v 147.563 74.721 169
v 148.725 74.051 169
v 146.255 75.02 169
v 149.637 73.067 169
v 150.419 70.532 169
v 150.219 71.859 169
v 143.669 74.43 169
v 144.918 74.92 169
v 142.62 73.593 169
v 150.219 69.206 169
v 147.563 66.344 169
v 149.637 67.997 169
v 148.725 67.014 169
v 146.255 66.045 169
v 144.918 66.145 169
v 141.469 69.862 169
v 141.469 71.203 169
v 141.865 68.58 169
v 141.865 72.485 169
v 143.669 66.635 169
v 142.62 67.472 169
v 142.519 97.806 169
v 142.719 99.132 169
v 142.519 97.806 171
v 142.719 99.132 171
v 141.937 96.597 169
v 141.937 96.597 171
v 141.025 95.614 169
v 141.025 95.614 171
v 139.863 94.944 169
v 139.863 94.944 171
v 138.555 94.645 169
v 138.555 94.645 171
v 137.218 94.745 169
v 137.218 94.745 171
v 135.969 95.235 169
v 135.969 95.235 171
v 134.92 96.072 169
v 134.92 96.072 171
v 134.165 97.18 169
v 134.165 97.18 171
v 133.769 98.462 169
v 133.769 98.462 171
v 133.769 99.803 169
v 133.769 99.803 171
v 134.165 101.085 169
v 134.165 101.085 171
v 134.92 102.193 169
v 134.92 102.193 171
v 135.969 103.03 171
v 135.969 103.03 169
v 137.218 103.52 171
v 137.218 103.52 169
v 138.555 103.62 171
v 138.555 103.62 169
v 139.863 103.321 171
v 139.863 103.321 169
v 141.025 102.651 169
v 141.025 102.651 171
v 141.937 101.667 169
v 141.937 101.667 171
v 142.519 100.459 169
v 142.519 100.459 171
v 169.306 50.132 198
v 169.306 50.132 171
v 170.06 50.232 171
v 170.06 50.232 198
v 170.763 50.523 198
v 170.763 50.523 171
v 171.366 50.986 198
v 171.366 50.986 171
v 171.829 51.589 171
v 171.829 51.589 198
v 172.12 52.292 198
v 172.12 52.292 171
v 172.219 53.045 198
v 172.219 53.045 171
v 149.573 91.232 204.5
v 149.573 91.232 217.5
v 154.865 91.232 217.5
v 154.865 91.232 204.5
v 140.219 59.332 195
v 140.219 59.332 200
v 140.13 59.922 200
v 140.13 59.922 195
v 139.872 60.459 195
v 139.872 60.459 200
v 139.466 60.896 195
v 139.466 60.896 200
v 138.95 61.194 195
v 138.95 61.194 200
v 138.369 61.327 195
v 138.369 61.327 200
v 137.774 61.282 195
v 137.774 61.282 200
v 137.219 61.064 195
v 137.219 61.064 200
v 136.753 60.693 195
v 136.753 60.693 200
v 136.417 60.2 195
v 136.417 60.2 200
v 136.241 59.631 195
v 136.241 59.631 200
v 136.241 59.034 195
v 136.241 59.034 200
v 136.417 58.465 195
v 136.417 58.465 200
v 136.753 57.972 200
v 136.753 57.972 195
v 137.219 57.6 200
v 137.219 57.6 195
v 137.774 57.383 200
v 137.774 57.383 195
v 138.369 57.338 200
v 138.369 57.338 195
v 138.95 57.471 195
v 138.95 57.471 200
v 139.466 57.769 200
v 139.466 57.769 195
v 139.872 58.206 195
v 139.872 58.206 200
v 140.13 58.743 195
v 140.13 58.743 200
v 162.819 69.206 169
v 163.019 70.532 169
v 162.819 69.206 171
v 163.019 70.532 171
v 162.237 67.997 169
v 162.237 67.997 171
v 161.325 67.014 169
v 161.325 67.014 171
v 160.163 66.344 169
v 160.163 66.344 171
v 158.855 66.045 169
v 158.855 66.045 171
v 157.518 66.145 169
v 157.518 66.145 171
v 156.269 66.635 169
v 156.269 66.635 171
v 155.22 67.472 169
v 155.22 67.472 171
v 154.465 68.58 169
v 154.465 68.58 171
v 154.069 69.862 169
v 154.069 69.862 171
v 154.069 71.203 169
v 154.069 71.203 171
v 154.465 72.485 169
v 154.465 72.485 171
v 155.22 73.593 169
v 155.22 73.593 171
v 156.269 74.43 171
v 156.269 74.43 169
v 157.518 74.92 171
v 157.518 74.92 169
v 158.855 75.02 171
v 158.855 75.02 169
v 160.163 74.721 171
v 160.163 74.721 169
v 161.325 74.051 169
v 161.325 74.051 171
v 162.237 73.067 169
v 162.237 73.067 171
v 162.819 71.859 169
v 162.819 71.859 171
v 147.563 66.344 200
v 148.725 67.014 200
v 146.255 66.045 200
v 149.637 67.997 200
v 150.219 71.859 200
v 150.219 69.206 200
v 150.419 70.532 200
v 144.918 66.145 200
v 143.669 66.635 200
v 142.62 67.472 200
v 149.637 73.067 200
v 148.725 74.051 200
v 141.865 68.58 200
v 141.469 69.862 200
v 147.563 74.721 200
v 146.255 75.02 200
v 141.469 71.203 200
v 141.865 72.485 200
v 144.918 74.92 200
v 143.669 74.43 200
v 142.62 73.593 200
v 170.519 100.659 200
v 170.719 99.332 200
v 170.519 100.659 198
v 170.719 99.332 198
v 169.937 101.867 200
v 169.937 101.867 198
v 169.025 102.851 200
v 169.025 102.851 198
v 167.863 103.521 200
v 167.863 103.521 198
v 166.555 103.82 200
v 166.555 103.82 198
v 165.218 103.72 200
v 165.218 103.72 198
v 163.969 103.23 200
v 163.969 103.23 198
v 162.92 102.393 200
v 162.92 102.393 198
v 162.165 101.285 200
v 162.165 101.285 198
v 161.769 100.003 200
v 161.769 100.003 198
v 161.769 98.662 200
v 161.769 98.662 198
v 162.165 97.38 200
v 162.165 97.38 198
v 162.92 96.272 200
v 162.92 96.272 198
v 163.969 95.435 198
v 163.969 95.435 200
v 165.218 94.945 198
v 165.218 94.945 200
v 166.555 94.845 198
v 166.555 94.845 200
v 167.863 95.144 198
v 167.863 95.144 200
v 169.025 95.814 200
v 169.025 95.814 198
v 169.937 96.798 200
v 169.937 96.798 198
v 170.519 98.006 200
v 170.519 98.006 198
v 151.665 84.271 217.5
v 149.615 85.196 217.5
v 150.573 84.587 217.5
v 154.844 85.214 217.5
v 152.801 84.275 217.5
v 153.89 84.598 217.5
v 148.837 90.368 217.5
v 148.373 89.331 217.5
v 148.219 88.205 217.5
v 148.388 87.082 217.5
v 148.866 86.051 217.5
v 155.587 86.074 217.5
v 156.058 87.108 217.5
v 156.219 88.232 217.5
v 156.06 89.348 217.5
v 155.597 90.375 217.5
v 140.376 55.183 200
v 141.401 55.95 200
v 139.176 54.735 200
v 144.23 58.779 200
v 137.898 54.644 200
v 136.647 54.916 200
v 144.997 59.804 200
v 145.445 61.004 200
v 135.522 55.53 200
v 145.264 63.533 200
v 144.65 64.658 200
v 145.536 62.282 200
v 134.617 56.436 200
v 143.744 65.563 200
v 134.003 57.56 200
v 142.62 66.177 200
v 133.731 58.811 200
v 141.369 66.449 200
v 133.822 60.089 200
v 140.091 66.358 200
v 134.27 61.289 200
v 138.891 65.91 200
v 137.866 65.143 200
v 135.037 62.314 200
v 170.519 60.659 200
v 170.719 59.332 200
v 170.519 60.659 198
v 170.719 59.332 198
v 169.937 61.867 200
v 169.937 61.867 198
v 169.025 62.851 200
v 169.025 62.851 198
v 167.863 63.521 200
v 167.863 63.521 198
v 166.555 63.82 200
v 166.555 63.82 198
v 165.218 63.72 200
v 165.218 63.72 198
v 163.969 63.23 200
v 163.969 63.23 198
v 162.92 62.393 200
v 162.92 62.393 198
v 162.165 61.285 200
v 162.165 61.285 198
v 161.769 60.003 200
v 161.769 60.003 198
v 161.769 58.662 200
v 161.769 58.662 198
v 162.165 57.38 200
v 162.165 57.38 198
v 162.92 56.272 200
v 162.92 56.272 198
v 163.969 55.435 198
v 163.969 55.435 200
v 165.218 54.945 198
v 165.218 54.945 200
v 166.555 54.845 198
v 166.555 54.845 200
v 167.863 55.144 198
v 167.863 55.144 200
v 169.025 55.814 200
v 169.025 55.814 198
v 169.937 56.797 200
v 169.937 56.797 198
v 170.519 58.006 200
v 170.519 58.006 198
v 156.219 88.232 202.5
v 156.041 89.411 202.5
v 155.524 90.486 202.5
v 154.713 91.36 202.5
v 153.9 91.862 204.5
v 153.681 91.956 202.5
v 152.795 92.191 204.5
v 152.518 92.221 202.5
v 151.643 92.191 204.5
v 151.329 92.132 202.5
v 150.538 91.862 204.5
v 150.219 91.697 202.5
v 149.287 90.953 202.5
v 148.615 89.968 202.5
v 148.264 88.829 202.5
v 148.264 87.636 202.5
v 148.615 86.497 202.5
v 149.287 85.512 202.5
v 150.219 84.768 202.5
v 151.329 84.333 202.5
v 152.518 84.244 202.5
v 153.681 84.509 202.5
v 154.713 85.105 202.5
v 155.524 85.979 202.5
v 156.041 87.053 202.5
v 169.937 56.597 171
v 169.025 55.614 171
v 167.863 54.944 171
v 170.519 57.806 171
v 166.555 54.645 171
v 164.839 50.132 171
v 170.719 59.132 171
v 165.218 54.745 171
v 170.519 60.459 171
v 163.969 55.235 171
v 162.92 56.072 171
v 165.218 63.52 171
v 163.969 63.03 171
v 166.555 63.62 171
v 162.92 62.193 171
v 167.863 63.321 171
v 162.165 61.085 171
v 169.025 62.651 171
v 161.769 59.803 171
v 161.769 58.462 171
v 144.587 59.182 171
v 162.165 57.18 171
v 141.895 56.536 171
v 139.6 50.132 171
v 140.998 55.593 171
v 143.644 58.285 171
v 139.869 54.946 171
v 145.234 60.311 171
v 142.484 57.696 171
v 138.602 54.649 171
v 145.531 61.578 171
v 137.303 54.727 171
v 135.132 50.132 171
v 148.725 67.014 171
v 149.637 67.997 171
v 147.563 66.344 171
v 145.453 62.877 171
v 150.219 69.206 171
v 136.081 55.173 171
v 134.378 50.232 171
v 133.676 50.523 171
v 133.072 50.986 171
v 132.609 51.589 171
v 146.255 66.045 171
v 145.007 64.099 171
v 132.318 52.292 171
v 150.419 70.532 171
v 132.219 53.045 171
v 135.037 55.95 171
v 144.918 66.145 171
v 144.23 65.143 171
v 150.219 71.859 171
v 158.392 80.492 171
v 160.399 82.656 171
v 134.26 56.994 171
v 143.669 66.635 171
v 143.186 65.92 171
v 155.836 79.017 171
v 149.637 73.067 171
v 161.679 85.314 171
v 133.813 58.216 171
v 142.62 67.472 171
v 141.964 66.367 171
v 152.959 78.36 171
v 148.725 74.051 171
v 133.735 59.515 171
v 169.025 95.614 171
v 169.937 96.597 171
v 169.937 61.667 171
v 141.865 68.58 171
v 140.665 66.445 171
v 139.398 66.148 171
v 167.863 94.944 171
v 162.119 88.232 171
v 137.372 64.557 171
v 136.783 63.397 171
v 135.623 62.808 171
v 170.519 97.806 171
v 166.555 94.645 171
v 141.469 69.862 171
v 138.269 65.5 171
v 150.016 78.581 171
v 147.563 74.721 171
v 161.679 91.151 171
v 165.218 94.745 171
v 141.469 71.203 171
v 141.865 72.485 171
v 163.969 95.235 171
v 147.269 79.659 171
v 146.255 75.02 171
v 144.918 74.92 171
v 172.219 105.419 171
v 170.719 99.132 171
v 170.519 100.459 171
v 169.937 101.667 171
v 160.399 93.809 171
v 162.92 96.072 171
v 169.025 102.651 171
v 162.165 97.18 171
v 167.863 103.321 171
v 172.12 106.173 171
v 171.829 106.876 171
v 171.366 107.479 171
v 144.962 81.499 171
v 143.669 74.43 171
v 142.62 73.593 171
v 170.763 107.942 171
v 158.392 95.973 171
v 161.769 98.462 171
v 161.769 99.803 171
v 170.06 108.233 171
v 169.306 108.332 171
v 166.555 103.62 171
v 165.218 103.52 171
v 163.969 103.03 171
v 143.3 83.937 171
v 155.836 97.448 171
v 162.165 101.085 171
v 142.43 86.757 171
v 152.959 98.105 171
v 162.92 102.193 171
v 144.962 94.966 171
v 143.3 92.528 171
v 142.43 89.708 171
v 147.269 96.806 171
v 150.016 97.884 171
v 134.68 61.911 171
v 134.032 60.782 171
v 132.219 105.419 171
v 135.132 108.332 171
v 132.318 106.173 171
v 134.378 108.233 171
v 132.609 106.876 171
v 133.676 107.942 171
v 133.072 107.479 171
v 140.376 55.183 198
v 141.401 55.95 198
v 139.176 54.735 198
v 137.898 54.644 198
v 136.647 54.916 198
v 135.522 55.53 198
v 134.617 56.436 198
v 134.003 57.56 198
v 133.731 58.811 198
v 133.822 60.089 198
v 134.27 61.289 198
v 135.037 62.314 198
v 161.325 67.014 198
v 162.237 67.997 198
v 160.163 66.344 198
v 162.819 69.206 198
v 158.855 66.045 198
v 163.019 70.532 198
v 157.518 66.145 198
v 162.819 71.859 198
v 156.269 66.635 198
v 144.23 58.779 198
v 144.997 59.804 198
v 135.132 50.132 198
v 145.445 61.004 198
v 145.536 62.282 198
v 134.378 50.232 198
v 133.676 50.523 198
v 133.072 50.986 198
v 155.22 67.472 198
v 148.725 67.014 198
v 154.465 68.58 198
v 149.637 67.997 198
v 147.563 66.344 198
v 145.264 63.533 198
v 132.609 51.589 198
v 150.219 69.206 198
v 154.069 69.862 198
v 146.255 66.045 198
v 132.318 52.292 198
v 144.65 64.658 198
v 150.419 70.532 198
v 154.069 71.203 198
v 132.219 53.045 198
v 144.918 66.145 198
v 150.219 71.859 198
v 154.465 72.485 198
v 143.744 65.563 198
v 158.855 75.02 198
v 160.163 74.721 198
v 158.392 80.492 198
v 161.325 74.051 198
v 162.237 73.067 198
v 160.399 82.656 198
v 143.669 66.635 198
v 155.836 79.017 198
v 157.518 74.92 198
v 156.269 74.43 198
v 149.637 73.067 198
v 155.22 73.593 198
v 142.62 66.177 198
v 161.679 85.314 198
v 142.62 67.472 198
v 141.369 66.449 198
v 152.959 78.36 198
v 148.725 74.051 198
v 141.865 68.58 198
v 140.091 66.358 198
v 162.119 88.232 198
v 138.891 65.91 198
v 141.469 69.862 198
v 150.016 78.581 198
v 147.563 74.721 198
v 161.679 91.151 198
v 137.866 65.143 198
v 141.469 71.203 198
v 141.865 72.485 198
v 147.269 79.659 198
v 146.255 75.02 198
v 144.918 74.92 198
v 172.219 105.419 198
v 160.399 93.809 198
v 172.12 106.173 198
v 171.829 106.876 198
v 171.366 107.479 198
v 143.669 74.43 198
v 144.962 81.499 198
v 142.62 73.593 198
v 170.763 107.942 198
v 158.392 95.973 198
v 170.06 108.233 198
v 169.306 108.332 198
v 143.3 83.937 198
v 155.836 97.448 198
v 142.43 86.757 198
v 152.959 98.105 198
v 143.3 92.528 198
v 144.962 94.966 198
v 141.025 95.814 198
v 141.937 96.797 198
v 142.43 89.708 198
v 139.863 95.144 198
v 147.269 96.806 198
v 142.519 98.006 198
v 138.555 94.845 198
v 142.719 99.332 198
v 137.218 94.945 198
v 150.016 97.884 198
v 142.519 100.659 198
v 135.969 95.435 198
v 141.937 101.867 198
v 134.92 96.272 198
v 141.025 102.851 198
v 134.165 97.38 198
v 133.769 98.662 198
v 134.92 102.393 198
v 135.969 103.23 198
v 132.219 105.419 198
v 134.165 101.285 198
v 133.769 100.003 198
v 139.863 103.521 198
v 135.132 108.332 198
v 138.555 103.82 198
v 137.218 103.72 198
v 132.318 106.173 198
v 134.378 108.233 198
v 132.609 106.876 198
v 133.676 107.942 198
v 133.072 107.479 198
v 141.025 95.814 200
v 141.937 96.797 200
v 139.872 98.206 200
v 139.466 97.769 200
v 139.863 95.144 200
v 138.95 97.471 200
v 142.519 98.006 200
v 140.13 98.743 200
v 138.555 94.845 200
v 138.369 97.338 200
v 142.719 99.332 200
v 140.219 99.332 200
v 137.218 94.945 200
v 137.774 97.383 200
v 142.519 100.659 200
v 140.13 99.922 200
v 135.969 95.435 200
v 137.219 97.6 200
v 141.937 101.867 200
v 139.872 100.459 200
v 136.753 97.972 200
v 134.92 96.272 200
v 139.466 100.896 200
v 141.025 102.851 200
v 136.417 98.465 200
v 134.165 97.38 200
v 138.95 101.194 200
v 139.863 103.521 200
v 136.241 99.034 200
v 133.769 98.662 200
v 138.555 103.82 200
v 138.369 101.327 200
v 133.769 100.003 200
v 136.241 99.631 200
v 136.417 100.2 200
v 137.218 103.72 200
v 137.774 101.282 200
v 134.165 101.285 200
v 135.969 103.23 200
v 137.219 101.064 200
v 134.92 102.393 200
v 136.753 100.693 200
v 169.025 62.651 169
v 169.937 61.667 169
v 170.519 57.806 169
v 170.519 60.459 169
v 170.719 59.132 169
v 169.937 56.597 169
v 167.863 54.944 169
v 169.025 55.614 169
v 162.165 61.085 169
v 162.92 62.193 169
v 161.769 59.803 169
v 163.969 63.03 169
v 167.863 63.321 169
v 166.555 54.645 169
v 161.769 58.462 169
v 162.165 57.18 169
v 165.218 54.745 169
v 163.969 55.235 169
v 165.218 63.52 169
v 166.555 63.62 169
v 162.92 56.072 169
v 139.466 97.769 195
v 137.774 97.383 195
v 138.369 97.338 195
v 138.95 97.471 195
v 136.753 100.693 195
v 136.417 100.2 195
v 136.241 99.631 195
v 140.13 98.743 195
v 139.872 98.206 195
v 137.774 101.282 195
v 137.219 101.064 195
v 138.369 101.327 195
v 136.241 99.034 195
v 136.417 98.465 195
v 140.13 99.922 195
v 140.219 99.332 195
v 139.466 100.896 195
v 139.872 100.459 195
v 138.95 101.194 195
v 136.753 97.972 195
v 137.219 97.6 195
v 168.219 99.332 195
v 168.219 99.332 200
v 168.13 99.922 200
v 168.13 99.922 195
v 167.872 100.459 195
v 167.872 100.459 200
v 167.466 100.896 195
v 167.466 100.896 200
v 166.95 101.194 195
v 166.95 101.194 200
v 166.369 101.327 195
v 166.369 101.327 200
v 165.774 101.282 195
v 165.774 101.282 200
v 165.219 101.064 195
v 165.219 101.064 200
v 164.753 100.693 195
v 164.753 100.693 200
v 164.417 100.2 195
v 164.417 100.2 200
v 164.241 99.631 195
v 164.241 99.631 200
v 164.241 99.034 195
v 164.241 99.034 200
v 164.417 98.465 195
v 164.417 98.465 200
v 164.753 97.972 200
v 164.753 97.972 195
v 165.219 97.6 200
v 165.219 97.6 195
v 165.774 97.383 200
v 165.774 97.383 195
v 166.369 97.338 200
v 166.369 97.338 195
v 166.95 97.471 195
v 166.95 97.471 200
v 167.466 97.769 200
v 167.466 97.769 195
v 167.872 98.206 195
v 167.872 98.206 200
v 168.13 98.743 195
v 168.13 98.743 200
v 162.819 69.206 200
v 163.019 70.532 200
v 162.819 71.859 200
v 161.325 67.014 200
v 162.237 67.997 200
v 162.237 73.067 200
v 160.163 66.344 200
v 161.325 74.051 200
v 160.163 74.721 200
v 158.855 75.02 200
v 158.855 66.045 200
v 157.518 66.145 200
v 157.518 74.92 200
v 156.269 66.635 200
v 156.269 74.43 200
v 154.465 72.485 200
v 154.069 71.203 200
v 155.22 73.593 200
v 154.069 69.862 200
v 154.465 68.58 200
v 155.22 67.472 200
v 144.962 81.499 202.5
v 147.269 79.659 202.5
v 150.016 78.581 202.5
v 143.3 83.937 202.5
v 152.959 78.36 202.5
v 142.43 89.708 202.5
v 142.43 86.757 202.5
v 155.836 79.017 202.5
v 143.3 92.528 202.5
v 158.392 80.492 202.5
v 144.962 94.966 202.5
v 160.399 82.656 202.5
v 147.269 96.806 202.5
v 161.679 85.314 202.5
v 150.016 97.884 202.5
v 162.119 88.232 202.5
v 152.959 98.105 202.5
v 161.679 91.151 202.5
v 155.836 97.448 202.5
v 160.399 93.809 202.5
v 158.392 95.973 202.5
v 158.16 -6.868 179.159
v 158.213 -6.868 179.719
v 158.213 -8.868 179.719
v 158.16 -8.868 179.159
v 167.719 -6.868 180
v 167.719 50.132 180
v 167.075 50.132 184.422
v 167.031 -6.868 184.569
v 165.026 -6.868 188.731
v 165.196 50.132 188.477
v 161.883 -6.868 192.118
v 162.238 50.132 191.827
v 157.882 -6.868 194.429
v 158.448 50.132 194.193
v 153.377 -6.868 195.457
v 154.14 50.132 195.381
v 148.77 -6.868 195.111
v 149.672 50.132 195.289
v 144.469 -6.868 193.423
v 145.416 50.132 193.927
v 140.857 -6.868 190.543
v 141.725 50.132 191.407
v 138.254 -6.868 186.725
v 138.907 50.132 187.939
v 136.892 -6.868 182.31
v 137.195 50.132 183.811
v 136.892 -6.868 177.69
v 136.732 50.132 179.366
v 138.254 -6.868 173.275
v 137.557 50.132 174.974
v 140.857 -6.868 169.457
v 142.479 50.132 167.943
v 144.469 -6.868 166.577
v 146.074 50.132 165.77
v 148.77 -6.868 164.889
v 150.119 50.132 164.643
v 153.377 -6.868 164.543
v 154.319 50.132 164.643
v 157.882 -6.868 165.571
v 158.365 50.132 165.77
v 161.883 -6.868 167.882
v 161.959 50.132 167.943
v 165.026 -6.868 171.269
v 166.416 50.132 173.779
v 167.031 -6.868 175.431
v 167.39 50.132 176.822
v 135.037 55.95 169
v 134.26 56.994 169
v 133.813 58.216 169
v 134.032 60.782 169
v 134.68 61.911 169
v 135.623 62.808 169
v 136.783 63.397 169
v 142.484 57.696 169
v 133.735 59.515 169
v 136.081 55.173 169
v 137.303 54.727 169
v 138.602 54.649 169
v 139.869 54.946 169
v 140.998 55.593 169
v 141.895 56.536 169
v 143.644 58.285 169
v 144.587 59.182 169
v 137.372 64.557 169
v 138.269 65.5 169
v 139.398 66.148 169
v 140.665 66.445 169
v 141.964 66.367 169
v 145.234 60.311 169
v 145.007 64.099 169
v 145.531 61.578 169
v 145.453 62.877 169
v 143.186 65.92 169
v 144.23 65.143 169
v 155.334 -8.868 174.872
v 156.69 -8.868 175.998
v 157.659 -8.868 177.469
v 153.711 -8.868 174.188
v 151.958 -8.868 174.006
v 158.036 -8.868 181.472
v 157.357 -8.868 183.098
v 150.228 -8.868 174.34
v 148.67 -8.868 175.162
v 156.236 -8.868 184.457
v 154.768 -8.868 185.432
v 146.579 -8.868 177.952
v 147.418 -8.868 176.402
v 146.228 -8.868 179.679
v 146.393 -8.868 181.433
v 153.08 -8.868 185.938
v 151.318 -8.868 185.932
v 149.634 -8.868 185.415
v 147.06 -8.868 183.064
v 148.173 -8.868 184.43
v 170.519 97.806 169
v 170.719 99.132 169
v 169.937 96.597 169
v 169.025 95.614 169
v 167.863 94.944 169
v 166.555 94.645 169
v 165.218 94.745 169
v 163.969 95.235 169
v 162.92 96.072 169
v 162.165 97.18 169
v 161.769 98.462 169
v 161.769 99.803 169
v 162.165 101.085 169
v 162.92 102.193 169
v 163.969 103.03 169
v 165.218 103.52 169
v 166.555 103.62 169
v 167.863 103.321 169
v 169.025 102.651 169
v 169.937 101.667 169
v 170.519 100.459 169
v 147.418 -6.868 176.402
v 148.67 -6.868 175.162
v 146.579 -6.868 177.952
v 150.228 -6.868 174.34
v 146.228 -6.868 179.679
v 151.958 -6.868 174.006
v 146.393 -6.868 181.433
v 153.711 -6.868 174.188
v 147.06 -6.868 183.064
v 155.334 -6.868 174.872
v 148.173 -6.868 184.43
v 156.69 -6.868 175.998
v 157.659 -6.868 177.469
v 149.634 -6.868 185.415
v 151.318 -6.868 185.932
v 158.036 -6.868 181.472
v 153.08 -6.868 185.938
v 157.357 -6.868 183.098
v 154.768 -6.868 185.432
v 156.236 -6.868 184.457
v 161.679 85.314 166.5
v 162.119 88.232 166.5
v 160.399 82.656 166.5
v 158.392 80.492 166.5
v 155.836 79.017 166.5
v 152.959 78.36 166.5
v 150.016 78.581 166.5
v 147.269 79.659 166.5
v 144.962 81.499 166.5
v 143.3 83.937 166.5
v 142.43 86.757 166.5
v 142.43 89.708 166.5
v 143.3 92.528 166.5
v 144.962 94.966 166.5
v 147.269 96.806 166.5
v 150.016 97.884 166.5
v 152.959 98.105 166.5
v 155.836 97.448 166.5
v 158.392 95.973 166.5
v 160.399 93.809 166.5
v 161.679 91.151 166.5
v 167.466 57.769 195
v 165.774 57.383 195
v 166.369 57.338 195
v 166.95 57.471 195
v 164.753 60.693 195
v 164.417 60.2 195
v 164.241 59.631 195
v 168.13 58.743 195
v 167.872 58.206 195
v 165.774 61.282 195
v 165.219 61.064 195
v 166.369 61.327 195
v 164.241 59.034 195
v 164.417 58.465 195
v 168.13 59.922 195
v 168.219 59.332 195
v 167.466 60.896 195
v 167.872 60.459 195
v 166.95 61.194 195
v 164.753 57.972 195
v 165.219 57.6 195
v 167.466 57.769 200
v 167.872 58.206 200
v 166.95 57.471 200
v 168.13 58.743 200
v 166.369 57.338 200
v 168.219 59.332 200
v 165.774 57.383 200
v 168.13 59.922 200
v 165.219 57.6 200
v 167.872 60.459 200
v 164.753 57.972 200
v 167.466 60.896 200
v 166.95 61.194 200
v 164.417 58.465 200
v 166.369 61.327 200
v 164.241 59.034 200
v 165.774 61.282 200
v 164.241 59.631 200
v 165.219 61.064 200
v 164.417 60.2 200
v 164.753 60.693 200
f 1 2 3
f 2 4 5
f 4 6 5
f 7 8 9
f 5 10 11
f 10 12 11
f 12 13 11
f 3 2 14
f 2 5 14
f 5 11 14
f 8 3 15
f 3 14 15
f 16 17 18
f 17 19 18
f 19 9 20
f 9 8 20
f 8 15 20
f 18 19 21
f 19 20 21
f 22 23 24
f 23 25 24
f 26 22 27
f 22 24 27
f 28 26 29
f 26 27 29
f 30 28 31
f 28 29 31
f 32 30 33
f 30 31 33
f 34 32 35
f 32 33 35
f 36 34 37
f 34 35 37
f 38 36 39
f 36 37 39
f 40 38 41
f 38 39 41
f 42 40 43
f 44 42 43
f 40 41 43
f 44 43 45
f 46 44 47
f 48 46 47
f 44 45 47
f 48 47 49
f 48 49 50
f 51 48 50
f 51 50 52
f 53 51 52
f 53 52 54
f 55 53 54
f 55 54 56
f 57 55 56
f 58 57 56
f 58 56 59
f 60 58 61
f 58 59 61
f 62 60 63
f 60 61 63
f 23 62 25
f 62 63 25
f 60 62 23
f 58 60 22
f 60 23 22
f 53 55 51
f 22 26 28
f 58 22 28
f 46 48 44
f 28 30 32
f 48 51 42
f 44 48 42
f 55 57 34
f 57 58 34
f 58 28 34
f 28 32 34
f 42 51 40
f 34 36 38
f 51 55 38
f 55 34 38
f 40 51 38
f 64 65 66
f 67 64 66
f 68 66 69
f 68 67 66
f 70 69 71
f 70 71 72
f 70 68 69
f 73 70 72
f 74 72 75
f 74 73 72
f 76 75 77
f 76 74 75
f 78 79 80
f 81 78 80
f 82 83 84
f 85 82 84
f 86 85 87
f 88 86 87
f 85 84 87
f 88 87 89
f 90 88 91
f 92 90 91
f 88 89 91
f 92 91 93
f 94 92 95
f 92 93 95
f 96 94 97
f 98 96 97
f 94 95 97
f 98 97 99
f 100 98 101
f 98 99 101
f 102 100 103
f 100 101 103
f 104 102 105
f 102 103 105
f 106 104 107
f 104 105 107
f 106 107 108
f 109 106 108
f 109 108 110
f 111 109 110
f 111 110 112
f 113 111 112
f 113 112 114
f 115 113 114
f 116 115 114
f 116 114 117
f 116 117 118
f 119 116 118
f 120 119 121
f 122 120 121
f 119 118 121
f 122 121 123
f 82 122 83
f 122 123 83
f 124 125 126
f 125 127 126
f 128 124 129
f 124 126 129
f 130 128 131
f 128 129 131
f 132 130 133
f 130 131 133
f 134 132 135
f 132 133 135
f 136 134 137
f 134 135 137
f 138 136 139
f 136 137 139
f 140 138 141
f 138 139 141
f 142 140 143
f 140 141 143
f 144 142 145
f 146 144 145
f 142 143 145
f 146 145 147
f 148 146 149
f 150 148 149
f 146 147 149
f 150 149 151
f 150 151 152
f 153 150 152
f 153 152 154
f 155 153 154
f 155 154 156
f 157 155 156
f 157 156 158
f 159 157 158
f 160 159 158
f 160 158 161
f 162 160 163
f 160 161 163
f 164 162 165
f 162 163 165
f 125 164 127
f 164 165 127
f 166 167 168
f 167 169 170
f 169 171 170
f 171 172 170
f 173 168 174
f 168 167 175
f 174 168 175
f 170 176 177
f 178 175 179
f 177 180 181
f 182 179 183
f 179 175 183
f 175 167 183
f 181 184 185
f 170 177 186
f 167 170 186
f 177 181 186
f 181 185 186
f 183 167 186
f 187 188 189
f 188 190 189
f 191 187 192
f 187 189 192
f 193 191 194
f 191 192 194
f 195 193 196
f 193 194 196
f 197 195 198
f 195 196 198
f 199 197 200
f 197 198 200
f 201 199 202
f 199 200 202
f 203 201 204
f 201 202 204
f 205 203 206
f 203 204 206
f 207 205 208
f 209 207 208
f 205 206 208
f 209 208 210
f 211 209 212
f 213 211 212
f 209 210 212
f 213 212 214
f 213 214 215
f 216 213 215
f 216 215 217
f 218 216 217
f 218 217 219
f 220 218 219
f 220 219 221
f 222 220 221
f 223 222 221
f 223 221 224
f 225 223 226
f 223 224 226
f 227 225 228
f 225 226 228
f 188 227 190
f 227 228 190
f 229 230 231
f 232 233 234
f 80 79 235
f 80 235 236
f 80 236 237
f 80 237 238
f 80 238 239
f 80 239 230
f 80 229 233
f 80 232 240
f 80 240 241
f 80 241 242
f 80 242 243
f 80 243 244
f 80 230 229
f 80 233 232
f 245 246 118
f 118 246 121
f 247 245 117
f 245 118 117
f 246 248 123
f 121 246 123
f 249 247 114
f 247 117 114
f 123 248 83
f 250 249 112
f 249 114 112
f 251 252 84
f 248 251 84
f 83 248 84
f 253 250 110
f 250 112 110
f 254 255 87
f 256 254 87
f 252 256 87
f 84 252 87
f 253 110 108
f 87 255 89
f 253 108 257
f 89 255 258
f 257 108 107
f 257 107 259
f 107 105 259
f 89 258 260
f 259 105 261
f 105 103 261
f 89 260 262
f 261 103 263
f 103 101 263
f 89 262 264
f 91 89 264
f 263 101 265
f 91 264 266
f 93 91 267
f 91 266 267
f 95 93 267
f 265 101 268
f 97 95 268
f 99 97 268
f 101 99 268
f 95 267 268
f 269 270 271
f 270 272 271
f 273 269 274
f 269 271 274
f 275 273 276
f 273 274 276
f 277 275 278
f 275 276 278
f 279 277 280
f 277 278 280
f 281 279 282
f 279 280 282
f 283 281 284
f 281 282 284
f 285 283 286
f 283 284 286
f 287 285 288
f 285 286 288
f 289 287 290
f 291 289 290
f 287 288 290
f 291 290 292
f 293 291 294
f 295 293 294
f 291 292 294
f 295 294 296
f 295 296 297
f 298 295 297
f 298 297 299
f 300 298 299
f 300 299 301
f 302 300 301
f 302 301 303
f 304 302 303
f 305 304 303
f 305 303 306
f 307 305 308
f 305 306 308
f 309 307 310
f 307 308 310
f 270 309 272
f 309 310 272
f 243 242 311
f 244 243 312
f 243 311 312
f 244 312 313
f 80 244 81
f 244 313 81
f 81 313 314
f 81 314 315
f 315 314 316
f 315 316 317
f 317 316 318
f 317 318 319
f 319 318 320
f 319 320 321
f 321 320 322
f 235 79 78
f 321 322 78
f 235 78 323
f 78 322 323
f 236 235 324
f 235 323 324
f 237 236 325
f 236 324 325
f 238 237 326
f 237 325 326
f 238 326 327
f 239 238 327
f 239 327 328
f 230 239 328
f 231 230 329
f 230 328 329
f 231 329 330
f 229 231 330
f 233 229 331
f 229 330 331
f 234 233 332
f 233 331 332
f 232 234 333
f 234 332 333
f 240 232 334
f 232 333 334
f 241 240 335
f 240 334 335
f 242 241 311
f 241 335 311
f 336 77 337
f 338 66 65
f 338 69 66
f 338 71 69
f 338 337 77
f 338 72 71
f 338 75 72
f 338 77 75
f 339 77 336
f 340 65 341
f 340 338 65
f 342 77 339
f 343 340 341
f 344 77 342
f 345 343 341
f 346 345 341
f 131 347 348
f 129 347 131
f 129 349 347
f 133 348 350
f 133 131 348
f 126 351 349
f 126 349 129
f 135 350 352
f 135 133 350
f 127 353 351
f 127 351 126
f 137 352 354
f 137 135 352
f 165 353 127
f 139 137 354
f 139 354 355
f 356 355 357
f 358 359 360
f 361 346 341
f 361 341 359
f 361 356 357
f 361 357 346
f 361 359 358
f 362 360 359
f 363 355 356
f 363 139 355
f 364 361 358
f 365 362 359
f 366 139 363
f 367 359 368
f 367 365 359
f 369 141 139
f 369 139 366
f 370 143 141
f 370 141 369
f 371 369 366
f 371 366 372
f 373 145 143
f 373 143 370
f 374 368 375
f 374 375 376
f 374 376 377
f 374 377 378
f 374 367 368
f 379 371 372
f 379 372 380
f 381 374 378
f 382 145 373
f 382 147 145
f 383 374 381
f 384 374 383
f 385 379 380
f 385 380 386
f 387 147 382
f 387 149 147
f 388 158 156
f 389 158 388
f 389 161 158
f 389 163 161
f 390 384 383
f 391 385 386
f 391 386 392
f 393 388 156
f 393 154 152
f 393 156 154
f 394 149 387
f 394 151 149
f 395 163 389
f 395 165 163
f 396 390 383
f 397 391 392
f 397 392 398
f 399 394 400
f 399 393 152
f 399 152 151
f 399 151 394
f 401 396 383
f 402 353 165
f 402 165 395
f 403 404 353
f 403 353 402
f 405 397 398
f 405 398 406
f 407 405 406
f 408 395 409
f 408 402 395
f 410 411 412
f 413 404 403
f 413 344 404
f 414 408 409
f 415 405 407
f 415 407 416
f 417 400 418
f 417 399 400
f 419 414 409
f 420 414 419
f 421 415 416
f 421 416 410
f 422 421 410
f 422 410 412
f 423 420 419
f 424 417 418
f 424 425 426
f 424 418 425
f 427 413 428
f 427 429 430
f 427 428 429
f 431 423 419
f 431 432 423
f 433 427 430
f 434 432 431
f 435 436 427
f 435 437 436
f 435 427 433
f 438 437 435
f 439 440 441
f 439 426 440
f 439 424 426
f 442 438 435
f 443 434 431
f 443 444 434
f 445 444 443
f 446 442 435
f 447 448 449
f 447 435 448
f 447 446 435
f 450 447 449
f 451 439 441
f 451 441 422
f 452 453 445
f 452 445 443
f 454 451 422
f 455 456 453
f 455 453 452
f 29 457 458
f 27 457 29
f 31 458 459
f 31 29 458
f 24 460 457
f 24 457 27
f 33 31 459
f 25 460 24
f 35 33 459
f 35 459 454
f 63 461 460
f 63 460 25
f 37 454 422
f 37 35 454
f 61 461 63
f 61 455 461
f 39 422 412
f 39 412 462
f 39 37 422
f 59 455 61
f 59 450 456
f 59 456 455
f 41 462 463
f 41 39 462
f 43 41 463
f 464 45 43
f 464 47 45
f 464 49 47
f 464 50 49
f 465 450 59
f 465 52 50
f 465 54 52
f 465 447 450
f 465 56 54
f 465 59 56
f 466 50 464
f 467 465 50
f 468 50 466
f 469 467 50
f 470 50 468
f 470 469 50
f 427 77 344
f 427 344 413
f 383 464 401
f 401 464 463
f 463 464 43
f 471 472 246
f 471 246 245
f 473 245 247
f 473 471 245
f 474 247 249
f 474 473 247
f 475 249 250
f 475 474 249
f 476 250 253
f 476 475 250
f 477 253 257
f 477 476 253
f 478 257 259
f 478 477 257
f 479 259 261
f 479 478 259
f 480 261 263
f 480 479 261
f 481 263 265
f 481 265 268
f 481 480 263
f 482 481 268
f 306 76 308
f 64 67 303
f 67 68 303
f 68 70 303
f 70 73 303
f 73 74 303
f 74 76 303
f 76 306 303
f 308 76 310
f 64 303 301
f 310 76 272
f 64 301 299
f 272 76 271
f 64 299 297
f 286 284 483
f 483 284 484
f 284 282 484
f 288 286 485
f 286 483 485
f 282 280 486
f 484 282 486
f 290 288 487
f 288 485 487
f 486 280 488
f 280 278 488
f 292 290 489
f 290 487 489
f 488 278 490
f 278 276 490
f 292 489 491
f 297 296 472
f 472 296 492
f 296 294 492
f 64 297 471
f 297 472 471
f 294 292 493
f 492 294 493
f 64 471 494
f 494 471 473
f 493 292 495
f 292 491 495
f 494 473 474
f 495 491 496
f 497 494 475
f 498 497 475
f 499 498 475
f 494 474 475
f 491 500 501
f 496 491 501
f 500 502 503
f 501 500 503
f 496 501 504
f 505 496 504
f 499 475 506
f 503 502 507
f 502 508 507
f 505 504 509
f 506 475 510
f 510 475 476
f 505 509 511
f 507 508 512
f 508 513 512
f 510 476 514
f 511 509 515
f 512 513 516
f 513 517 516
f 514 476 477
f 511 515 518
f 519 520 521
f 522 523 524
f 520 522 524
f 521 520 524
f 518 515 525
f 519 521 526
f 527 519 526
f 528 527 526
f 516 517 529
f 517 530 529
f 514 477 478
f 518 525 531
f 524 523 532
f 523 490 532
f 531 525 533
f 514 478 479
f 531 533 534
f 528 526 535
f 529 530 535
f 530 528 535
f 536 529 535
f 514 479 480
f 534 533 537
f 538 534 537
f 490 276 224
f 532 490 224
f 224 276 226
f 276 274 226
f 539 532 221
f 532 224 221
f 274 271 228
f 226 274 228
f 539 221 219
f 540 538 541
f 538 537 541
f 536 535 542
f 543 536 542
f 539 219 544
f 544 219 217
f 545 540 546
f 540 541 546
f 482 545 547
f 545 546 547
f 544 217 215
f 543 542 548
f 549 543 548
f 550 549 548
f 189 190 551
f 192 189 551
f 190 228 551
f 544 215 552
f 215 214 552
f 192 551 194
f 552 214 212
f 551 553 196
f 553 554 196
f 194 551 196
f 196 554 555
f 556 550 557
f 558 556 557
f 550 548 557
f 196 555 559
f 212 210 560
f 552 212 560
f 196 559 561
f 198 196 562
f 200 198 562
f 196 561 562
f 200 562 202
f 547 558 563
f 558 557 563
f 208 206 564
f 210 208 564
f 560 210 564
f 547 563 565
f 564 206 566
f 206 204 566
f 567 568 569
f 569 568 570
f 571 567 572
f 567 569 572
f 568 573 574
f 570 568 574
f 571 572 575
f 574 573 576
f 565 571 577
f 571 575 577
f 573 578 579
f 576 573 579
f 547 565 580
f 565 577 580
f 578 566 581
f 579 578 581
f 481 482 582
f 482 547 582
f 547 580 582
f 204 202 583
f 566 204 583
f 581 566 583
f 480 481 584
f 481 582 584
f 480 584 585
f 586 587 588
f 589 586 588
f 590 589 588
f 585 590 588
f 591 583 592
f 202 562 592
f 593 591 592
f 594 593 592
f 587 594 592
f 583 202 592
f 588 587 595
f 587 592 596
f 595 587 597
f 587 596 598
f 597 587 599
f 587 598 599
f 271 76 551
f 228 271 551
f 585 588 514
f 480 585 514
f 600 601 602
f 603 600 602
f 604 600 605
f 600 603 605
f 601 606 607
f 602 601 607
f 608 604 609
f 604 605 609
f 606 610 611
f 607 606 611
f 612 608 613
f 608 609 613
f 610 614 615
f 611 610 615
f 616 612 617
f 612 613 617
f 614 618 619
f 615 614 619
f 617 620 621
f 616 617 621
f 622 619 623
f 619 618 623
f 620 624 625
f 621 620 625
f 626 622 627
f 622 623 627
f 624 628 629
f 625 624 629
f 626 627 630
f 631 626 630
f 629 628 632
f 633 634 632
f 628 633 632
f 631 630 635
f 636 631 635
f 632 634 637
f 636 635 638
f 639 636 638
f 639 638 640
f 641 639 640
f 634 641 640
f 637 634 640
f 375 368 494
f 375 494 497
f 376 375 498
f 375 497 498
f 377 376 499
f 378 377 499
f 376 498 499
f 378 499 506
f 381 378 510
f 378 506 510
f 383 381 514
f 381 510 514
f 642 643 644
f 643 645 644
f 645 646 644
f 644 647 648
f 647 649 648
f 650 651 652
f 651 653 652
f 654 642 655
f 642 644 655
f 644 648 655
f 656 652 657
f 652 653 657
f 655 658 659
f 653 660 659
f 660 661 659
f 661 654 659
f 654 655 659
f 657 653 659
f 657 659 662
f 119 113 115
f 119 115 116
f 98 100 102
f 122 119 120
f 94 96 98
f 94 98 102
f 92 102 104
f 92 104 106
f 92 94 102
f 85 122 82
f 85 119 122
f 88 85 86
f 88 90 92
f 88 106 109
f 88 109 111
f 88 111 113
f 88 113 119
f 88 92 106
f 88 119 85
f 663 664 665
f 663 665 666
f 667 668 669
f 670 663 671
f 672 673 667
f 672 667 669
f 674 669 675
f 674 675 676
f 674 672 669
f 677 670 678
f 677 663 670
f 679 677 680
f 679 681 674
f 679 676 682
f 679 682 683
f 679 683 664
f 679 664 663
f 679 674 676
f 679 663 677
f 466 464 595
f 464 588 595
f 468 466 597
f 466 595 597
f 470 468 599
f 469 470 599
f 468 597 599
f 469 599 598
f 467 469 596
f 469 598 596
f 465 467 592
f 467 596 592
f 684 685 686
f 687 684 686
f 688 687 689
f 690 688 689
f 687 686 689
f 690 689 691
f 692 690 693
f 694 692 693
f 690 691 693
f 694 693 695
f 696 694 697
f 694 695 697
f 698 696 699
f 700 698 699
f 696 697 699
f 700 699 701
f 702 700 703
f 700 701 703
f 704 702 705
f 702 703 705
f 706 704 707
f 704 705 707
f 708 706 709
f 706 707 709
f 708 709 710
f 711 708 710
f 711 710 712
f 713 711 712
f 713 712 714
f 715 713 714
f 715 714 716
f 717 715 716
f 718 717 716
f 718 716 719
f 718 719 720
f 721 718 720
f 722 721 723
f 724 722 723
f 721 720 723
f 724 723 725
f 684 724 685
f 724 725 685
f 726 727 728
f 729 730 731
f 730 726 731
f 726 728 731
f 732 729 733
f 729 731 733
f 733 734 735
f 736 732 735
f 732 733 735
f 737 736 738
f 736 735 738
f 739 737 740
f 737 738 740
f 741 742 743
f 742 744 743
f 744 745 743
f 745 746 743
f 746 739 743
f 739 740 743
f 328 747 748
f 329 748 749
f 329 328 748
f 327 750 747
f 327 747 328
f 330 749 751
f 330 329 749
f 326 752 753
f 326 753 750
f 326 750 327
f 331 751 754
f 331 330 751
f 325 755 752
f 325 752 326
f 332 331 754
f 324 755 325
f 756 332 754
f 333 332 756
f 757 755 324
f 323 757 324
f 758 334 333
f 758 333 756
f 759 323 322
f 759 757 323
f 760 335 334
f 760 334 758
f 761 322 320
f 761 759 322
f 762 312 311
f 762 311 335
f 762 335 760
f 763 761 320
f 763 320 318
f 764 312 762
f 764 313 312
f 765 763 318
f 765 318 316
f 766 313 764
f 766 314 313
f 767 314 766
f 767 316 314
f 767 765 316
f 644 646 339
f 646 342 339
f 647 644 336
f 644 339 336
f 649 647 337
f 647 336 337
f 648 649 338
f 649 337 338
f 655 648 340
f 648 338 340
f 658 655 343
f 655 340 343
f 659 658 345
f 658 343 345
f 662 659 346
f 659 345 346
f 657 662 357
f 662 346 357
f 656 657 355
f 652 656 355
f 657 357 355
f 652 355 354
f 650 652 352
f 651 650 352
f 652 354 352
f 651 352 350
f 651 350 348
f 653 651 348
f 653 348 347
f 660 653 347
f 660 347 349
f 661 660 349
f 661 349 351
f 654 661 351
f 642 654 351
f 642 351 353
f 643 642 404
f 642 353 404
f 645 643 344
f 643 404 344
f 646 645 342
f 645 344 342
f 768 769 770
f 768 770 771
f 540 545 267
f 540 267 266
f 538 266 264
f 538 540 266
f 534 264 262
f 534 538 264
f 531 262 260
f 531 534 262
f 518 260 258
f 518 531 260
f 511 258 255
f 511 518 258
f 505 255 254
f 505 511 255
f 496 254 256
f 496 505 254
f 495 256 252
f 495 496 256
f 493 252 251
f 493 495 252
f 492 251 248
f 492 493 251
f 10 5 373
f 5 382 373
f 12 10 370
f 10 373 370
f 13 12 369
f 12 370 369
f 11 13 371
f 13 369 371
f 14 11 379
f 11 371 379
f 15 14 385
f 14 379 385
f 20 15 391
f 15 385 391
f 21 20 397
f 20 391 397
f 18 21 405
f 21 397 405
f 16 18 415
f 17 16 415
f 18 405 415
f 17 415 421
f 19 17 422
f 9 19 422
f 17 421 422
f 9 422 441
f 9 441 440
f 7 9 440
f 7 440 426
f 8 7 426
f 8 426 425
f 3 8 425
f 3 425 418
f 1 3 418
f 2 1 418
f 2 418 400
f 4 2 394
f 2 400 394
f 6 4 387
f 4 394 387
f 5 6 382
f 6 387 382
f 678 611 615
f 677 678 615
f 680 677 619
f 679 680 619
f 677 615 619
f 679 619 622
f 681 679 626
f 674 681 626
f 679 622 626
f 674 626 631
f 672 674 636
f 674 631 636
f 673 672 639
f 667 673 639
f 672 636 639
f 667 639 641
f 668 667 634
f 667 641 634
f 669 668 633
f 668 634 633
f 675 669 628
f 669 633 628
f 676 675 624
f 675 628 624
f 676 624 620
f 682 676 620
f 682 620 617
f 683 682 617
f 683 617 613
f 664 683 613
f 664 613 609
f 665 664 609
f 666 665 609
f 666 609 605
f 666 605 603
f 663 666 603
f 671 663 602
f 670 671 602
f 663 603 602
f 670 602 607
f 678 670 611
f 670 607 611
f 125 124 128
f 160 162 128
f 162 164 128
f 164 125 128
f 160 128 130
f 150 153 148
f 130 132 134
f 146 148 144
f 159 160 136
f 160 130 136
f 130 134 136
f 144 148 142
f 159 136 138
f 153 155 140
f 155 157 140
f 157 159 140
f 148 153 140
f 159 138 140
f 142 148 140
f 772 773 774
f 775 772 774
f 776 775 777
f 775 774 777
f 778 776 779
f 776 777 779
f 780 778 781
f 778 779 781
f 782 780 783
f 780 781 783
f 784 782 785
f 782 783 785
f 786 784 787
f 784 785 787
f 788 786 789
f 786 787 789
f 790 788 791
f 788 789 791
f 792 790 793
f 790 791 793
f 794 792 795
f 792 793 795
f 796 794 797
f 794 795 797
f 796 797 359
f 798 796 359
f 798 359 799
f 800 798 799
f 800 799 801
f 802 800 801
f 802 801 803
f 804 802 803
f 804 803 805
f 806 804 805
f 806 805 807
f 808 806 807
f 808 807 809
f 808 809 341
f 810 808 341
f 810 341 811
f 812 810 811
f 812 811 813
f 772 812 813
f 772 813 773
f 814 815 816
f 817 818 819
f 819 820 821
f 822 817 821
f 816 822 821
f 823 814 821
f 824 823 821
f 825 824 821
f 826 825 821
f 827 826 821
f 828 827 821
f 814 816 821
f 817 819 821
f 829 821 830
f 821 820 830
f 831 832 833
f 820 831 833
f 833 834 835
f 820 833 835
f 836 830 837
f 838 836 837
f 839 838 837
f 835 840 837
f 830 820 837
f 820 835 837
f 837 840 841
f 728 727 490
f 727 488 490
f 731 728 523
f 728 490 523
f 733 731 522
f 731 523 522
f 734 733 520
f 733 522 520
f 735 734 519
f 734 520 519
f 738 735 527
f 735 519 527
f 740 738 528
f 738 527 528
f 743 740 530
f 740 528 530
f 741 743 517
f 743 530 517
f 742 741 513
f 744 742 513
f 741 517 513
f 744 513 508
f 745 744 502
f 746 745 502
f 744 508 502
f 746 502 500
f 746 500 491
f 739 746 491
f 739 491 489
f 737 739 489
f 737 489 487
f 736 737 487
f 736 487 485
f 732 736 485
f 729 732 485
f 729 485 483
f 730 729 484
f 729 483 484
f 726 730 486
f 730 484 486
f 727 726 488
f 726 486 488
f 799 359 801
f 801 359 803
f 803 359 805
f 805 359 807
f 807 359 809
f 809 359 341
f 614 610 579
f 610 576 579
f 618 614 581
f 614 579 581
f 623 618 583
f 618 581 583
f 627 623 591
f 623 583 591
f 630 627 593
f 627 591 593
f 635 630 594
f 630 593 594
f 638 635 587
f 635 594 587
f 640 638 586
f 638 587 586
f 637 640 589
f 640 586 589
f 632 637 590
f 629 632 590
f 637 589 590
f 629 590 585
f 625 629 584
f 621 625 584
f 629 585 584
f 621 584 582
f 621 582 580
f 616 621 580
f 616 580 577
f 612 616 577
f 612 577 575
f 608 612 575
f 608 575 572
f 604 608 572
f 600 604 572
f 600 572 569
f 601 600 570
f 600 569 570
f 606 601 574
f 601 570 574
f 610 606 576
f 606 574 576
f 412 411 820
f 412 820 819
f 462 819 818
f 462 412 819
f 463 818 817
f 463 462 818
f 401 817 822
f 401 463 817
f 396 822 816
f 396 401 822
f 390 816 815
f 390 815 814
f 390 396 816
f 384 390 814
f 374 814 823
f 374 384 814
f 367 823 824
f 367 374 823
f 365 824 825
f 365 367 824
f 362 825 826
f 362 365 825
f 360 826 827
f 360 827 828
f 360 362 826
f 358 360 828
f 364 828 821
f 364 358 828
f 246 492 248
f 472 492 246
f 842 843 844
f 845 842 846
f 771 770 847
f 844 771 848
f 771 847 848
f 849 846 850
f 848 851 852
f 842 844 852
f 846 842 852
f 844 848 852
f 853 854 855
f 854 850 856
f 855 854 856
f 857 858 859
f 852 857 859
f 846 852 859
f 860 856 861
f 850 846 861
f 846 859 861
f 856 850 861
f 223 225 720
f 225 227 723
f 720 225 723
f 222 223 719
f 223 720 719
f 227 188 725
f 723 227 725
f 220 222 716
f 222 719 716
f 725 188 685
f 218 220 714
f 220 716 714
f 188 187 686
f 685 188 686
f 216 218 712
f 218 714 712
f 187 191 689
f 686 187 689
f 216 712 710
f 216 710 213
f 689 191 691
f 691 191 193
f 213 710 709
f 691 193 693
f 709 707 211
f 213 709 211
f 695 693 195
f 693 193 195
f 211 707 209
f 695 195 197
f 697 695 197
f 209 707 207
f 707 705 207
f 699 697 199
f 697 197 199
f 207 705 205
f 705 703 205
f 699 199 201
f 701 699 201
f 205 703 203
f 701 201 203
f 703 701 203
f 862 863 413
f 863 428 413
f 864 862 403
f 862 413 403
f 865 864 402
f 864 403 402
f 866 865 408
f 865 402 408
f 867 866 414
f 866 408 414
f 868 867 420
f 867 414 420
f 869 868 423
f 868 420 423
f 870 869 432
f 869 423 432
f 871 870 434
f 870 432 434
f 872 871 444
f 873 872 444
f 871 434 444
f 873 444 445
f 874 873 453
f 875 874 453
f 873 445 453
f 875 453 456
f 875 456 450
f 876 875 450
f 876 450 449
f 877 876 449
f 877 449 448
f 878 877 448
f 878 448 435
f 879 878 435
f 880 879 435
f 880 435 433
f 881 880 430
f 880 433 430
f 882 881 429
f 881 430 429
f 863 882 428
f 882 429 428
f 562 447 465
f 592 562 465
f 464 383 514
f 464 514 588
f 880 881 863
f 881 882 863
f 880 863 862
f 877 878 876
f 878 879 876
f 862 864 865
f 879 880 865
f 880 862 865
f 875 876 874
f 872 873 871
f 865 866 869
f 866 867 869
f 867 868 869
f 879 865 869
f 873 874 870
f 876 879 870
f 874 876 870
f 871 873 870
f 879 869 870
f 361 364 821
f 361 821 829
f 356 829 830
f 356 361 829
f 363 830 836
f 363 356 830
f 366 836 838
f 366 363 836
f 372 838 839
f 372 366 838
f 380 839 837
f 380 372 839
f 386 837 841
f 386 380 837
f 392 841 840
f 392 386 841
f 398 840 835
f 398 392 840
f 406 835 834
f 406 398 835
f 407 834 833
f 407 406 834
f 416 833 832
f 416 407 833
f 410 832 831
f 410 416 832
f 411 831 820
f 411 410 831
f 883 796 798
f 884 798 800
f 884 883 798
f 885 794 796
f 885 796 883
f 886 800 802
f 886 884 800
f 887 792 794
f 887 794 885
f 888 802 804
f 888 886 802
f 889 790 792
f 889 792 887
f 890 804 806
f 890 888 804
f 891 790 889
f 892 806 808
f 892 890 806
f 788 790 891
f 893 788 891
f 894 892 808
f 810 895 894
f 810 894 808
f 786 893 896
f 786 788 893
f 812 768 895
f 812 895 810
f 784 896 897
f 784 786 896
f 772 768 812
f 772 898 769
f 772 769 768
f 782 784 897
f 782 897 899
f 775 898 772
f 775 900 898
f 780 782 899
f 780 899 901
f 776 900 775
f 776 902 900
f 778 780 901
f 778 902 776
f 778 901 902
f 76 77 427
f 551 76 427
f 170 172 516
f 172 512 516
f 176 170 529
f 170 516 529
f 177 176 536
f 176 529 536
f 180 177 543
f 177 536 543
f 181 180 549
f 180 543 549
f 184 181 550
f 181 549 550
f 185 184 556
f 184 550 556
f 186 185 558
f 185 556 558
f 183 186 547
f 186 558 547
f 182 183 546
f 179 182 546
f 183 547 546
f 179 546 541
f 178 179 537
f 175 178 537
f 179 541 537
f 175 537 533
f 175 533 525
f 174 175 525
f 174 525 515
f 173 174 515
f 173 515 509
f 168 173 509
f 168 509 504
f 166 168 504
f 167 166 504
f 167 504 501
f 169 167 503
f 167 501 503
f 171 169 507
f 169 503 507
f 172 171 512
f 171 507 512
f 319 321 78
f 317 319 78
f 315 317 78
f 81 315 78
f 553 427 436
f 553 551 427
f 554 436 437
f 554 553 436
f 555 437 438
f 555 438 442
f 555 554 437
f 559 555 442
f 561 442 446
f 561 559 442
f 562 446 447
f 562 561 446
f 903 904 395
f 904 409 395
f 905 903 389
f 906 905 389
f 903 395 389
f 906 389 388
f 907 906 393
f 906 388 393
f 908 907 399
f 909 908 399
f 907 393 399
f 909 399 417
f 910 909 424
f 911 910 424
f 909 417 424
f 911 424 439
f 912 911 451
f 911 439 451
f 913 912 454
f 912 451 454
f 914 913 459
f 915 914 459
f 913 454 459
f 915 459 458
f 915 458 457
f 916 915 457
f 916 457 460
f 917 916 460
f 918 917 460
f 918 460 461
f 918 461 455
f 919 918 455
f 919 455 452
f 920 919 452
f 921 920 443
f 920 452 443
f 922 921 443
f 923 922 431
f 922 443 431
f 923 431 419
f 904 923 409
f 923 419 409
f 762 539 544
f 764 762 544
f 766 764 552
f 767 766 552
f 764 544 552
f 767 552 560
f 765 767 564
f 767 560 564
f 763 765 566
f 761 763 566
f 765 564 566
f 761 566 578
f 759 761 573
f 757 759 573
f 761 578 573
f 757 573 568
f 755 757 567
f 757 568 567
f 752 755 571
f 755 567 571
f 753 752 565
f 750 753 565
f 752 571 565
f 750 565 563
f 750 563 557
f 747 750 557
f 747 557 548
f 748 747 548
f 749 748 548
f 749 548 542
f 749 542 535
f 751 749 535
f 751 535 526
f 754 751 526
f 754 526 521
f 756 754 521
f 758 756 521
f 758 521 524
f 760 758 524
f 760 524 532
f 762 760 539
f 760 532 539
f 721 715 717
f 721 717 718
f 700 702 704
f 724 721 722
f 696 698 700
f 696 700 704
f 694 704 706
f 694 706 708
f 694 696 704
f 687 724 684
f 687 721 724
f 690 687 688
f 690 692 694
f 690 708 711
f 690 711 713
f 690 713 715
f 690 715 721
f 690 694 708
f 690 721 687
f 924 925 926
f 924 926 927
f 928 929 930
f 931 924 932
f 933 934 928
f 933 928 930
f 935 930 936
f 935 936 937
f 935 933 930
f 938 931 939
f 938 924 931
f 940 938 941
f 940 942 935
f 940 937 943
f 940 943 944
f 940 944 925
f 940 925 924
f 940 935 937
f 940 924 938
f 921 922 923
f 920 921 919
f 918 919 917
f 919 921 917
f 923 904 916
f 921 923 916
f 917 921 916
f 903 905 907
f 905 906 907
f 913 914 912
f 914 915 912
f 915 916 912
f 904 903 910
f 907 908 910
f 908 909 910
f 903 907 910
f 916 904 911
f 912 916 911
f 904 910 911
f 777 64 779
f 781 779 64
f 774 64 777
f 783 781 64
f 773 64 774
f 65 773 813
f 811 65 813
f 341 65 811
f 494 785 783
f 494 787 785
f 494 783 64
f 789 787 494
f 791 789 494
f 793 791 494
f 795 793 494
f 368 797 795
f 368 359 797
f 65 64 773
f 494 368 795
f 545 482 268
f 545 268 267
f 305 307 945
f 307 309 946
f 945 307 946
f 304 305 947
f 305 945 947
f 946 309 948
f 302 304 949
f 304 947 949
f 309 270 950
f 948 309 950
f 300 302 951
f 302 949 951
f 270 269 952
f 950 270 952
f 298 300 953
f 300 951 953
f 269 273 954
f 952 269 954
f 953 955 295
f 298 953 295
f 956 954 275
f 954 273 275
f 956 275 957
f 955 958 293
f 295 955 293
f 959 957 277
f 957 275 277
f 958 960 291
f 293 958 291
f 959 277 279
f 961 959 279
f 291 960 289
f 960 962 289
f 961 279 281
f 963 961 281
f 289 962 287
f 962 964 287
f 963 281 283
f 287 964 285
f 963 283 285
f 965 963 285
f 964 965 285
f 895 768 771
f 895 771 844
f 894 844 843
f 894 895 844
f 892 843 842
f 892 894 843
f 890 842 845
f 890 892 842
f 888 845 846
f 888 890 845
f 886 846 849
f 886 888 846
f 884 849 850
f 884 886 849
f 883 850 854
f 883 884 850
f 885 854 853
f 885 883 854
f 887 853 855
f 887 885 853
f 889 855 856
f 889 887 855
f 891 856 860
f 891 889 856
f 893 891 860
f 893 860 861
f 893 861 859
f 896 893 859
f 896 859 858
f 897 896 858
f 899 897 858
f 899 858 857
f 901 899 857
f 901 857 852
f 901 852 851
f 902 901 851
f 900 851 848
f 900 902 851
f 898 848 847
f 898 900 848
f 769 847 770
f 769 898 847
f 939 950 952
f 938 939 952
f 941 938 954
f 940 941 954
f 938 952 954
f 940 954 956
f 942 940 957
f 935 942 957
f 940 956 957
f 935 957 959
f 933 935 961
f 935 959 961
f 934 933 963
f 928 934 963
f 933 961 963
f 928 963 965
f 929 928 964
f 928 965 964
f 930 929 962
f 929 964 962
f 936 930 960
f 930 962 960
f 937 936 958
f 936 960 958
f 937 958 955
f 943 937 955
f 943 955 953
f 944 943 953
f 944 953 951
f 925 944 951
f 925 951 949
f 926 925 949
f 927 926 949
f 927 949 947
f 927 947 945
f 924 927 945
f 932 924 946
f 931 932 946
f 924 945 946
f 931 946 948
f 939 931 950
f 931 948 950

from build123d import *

# Parameters (mm, degrees)
SKETCH1_W           = 40
SKETCH1_H           = 58.200000762
BOSS_EXTRUDE1_DEPTH = 27
SKETCH2_R           = 15.499999921
BOSS_EXTRUDE2_DEPTH = 57
SKETCH3_R           = 9.900000829
BOSS_EXTRUDE3_DEPTH = 4.5
SKETCH4_R           = 3.999999654
BOSS_EXTRUDE4_DEPTH = 15
CUT_EXTRUDE1_DEPTH  = 13
BOSS_EXTRUDE5_DEPTH = 2
BOSS_EXTRUDE6_DEPTH = 2
BOSS_EXTRUDE7_DEPTH = 2
SKETCH9_W           = 4.500000339
SKETCH9_H           = 2
SKETCH10_W          = 4.500000226
SKETCH10_H          = 2
SKETCH11_W          = 4.499999816
SKETCH11_H          = 2
SKETCH12_W          = 4.500000657
SKETCH12_H          = 2
SKETCH13_W          = 4.49999985
SKETCH13_H          = 2
SKETCH14_W          = 9.899999781
SKETCH14_H          = 4.5
SKETCH15_W          = 4.500000004
SKETCH15_H          = 2
SKETCH16_W          = 4.49999905
SKETCH16_H          = 2
SKETCH17_W          = 4.499999637
SKETCH17_H          = 2
SKETCH18_W          = 4.500001132
SKETCH18_H          = 2
SKETCH19_W          = 4.499999489
SKETCH19_H          = 2
FILLET1_R           = 2.913033302
SKETCH20_R          = 2
CUT_EXTRUDE2_DEPTH  = 5


with BuildPart() as part:
    # Sketch1 → Boss-Extrude1 (new body)
    with BuildSketch(Plane(origin=(0, 0, 171), x_dir=(-1, 0, 0), z_dir=(0, 0, -1))):
        with Locations((-152.219146729, 79.232439518)):
            Rectangle(SKETCH1_W, SKETCH1_H)
    extrude(amount=-BOSS_EXTRUDE1_DEPTH)

    # Sketch2 → Boss-Extrude2 (add)
    with BuildSketch(Plane.XZ.offset(-50.132439137)):
        with Locations((152.219146662, 180.000000025)):
            Circle(SKETCH2_R)
    extrude(amount=BOSS_EXTRUDE2_DEPTH)

    # Sketch3 → Boss-Extrude3 (add)
    with BuildSketch(Plane.XY.offset(198)):
        with Locations((152.21914569, 88.232439899)):
            Circle(SKETCH3_R)
    extrude(amount=BOSS_EXTRUDE3_DEPTH)

    # Sketch4 → Boss-Extrude4 (add)
    with BuildSketch(Plane.XY.offset(202.5)):
        with Locations((152.219146674, 88.232439899)):
            Circle(SKETCH4_R)
    extrude(amount=BOSS_EXTRUDE4_DEPTH)

    # Sketch5 → Cut-Extrude1 (cut)
    with BuildSketch(Plane.XY.offset(217.5)):
        with BuildLine():
            Line((149.573395252, 91.232439899), (154.864898205, 91.232439899))
            ThreePointArc((154.864898205, 91.232439899), (152.219146729, 92.232440009), (149.573395252, 91.232439899))
        make_face()
    extrude(amount=-CUT_EXTRUDE1_DEPTH, mode=Mode.SUBTRACT)

    # Sketch6 → Boss-Extrude5 (add)
    with BuildSketch(Plane.XY.offset(198)):
        with BuildLine():
            Line((135.03716583, 62.314419458), (137.865592743, 65.142846371))
            ThreePointArc((137.865592743, 65.142846371), (144.229553368, 65.142846505), (144.22955377, 58.778885881))
            Line((144.22955377, 58.778885881), (141.401127095, 55.95045873))
            ThreePointArc((141.401127095, 55.95045873), (135.037165964, 55.950458327), (135.03716583, 62.314419458))
        make_face()
    extrude(amount=BOSS_EXTRUDE5_DEPTH)

    # Sketch7 → Boss-Extrude6 (add)
    with BuildSketch(Plane(origin=(0, 0, 171), x_dir=(-1, 0, 0), z_dir=(0, 0, -1))):
        with BuildLine():
            ThreePointArc((-142.483799553, 57.696214596), (-144.229553379, 65.142847459), (-136.782921252, 63.397090493))
            ThreePointArc((-136.782921252, 63.397090493), (-135.037167167, 55.950457372), (-142.483799553, 57.696214596))
        make_face()
    extrude(amount=BOSS_EXTRUDE6_DEPTH)

    # Sketch8 → Boss-Extrude7 (add)
    with BuildSketch(Plane.XZ.offset(6.867560863)):
        with BuildLine():
            Line((158.212552085, 179.71876642), (158.159881829, 179.158770706))
            ThreePointArc((158.159881829, 179.158770706), (146.245510806, 180.561848666), (158.212552085, 179.71876642))
        make_face()
    extrude(amount=BOSS_EXTRUDE7_DEPTH)

    # Sketch9 → Revolve1 (revolve)
    with BuildSketch(Plane.XZ.offset(-59.132439085)):
        with Locations((168.469147961, 170)):
            Rectangle(SKETCH9_W, SKETCH9_H)
    revolve(axis=Axis((166.219147791, 59.132439085, 171), (0, 0, -1)))

    # Sketch10 → Revolve2 (revolve)
    with BuildSketch(Plane.XZ.offset(-99.132437815)):
        with Locations((140.469147187, 170)):
            Rectangle(SKETCH10_W, SKETCH10_H)
    revolve(axis=Axis((138.219147074, 99.132437815, 171), (0, 0, -1)))

    # Sketch11 → Revolve3 (revolve)
    with BuildSketch(Plane.XZ.offset(-70.532439222)):
        with Locations((160.769146188, 170)):
            Rectangle(SKETCH11_W, SKETCH11_H)
    revolve(axis=Axis((158.51914628, 70.532439222, 171), (0, 0, -1)))

    # Sketch12 → Revolve4 (revolve)
    with BuildSketch(Plane.XZ.offset(-99.132437815)):
        with Locations((168.46914727, 170)):
            Rectangle(SKETCH12_W, SKETCH12_H)
    revolve(axis=Axis((166.219146941, 99.132437815, 171), (0, 0, -1)))

    # Sketch13 → Revolve5 (revolve)
    with BuildSketch(Plane.XZ.offset(-70.532439222)):
        with Locations((148.16914686, 170)):
            Rectangle(SKETCH13_W, SKETCH13_H)
    revolve(axis=Axis((145.919146935, 70.532439222, 171), (0, 0, -1)))

    # Sketch14 → Revolve6 (revolve)
    with BuildSketch(Plane.XZ.offset(-88.232439085)):
        with Locations((157.169146737, 168.75)):
            Rectangle(SKETCH14_W, SKETCH14_H)
    revolve(axis=Axis((152.219146846, 88.232439085, 171), (0, 0, -1)))

    # Sketch15 → Revolve7 (revolve)
    with BuildSketch(Plane(origin=(0, 59.332439899, 0), x_dir=(1, 0, 0), z_dir=(0, 1, 0))):
        with Locations((168.469147213, -199)):
            Rectangle(SKETCH15_W, SKETCH15_H)
    revolve(axis=Axis((166.219147211, 59.332439899, 198), (0, 0, 1)))

    # Sketch16 → Revolve8 (revolve)
    with BuildSketch(Plane(origin=(0, 99.332439899, 0), x_dir=(1, 0, 0), z_dir=(0, 1, 0))):
        with Locations((168.469146681, -199)):
            Rectangle(SKETCH16_W, SKETCH16_H)
    revolve(axis=Axis((166.219147156, 99.332439899, 198), (0, 0, 1)))

    # Sketch17 → Revolve9 (revolve)
    with BuildSketch(Plane(origin=(0, 70.532438002, 0), x_dir=(1, 0, 0), z_dir=(0, 1, 0))):
        with Locations((160.769147041, -199)):
            Rectangle(SKETCH17_W, SKETCH17_H)
    revolve(axis=Axis((158.519147223, 70.532438002, 198), (0, 0, 1)))

    # Sketch18 → Revolve10 (revolve)
    with BuildSketch(Plane(origin=(0, 99.332439899, 0), x_dir=(1, 0, 0), z_dir=(0, 1, 0))):
        with Locations((140.469146163, -199)):
            Rectangle(SKETCH18_W, SKETCH18_H)
    revolve(axis=Axis((138.219145597, 99.332439899, 198), (0, 0, 1)))

    # Sketch19 → Revolve11 (revolve)
    with BuildSketch(Plane(origin=(0, 70.532438002, 0), x_dir=(1, 0, 0), z_dir=(0, 1, 0))):
        with Locations((148.169147032, -199)):
            Rectangle(SKETCH19_W, SKETCH19_H)
    revolve(axis=Axis((145.919147287, 70.532438002, 198), (0, 0, 1)))

    # Fillet1
    fillet1_edges = [part.edges().sort_by_distance(p)[0] for p in [
        (132.219146729, 108.332439899, 184.5),
        (132.219146729, 50.132439137, 184.5),
        (172.219146729, 50.132439137, 184.5),
        (172.219146729, 108.332439899, 184.5),
    ]]
    fillet(fillet1_edges, radius=FILLET1_R)

    # Sketch20 → Cut-Extrude2 (cut)
    with BuildSketch(Plane.XY.offset(200)):
        with Locations((138.219145597, 99.332439899)):
            Circle(SKETCH20_R)
        with Locations((166.219147211, 99.332439899)):
            Circle(SKETCH20_R)
        with Locations((138.219145597, 59.332439899)):
            Circle(SKETCH20_R)
        with Locations((166.219147211, 59.332439899)):
            Circle(SKETCH20_R)
    extrude(amount=-CUT_EXTRUDE2_DEPTH, mode=Mode.SUBTRACT)


solid = part.part
